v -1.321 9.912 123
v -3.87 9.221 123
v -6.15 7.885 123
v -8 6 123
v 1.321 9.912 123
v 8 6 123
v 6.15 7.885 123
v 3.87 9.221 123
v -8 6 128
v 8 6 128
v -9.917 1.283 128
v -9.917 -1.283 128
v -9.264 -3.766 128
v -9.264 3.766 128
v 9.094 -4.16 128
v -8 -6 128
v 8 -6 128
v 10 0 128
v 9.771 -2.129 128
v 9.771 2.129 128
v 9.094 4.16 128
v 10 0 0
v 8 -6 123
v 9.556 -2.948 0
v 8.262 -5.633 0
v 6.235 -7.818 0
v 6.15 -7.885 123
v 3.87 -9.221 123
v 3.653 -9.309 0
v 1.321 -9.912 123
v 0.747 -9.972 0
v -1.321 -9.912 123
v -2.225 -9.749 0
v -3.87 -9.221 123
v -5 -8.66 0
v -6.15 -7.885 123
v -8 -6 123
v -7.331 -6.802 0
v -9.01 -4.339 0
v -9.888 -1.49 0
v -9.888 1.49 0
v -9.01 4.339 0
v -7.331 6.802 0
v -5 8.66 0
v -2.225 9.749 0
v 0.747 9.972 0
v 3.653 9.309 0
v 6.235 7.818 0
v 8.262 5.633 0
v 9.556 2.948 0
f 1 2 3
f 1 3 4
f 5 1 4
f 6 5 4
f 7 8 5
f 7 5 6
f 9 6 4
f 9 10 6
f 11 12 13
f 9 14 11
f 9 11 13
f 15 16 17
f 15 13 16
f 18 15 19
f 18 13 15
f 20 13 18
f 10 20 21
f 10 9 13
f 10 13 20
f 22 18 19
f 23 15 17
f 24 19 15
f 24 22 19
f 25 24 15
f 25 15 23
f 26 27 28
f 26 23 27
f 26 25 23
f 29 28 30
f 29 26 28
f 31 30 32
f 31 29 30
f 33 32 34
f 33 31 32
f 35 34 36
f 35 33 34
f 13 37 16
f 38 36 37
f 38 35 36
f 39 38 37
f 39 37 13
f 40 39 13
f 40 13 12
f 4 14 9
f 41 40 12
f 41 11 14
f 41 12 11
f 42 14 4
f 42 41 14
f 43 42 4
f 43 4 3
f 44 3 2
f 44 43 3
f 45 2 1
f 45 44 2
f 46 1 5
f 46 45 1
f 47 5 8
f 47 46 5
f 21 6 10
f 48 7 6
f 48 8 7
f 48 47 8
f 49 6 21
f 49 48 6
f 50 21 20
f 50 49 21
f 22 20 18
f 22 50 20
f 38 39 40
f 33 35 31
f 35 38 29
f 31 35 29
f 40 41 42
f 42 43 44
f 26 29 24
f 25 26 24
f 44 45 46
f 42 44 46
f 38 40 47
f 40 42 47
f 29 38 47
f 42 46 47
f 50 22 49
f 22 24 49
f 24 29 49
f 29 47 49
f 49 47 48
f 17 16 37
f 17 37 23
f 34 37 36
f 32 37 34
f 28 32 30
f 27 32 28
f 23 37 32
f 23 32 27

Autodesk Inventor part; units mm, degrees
ref_plane "YZ Plane" through (0, 0, 0) normal (1, 0, 0) x (0, 1, 0)
ref_plane "XZ Plane" through (0, 0, 0) normal (0, 1, 0) x (-1, 0, 0)
ref_plane "XY Plane" through (0, 0, 0) normal (0, 0, 1) x (1, 0, 0)
sketch "Эскиз1" plane through (0, 0, 0) normal (0, 0, 1) x (1, 0, 0)
  circle A0 centre (0, 0) radius 10
  dimension "d0" = 20
extrude "Выдавливание1" add sketch "Эскиз1" along normal blind 128
sketch "Эскиз2" plane through (0, 0, 128) normal (0, 0, 1) x (1, 0, 0)
  circle A0 centre (0, 0) radius 10 projected
  line L0 (8, 6) -> (-8, 6)
  line L1 (-8, -6) -> (8, -6)
  dimension "d3" = 12
extrude "Выдавливание2" cut sketch "Эскиз2" against normal blind 5 contours L0 A0 | A0 L1
equation "\"d0\" = d_main_shaft"
equation "\"d3\" = width_flattened_surface"
equation "\"d_main_shaft\" = 20"
equation "\"tolerance_plazma\" = 0.1"
equation "\"thickness_steel\" = 3"
equation "\"d_main_screw_holes\" = 6.1"
equation "\"thickness_profile_tibea\" = 3"
equation "\"thickness_profile_femur\" = 3"
equation "\"width_flattened_surface\" = 12"
equation "\"width_shaft_shift\" = 35"
equation "\"hight_shaft_shift\" = 37"
properties part number "shaft_tibea" material "Сталь 09Г2С"
